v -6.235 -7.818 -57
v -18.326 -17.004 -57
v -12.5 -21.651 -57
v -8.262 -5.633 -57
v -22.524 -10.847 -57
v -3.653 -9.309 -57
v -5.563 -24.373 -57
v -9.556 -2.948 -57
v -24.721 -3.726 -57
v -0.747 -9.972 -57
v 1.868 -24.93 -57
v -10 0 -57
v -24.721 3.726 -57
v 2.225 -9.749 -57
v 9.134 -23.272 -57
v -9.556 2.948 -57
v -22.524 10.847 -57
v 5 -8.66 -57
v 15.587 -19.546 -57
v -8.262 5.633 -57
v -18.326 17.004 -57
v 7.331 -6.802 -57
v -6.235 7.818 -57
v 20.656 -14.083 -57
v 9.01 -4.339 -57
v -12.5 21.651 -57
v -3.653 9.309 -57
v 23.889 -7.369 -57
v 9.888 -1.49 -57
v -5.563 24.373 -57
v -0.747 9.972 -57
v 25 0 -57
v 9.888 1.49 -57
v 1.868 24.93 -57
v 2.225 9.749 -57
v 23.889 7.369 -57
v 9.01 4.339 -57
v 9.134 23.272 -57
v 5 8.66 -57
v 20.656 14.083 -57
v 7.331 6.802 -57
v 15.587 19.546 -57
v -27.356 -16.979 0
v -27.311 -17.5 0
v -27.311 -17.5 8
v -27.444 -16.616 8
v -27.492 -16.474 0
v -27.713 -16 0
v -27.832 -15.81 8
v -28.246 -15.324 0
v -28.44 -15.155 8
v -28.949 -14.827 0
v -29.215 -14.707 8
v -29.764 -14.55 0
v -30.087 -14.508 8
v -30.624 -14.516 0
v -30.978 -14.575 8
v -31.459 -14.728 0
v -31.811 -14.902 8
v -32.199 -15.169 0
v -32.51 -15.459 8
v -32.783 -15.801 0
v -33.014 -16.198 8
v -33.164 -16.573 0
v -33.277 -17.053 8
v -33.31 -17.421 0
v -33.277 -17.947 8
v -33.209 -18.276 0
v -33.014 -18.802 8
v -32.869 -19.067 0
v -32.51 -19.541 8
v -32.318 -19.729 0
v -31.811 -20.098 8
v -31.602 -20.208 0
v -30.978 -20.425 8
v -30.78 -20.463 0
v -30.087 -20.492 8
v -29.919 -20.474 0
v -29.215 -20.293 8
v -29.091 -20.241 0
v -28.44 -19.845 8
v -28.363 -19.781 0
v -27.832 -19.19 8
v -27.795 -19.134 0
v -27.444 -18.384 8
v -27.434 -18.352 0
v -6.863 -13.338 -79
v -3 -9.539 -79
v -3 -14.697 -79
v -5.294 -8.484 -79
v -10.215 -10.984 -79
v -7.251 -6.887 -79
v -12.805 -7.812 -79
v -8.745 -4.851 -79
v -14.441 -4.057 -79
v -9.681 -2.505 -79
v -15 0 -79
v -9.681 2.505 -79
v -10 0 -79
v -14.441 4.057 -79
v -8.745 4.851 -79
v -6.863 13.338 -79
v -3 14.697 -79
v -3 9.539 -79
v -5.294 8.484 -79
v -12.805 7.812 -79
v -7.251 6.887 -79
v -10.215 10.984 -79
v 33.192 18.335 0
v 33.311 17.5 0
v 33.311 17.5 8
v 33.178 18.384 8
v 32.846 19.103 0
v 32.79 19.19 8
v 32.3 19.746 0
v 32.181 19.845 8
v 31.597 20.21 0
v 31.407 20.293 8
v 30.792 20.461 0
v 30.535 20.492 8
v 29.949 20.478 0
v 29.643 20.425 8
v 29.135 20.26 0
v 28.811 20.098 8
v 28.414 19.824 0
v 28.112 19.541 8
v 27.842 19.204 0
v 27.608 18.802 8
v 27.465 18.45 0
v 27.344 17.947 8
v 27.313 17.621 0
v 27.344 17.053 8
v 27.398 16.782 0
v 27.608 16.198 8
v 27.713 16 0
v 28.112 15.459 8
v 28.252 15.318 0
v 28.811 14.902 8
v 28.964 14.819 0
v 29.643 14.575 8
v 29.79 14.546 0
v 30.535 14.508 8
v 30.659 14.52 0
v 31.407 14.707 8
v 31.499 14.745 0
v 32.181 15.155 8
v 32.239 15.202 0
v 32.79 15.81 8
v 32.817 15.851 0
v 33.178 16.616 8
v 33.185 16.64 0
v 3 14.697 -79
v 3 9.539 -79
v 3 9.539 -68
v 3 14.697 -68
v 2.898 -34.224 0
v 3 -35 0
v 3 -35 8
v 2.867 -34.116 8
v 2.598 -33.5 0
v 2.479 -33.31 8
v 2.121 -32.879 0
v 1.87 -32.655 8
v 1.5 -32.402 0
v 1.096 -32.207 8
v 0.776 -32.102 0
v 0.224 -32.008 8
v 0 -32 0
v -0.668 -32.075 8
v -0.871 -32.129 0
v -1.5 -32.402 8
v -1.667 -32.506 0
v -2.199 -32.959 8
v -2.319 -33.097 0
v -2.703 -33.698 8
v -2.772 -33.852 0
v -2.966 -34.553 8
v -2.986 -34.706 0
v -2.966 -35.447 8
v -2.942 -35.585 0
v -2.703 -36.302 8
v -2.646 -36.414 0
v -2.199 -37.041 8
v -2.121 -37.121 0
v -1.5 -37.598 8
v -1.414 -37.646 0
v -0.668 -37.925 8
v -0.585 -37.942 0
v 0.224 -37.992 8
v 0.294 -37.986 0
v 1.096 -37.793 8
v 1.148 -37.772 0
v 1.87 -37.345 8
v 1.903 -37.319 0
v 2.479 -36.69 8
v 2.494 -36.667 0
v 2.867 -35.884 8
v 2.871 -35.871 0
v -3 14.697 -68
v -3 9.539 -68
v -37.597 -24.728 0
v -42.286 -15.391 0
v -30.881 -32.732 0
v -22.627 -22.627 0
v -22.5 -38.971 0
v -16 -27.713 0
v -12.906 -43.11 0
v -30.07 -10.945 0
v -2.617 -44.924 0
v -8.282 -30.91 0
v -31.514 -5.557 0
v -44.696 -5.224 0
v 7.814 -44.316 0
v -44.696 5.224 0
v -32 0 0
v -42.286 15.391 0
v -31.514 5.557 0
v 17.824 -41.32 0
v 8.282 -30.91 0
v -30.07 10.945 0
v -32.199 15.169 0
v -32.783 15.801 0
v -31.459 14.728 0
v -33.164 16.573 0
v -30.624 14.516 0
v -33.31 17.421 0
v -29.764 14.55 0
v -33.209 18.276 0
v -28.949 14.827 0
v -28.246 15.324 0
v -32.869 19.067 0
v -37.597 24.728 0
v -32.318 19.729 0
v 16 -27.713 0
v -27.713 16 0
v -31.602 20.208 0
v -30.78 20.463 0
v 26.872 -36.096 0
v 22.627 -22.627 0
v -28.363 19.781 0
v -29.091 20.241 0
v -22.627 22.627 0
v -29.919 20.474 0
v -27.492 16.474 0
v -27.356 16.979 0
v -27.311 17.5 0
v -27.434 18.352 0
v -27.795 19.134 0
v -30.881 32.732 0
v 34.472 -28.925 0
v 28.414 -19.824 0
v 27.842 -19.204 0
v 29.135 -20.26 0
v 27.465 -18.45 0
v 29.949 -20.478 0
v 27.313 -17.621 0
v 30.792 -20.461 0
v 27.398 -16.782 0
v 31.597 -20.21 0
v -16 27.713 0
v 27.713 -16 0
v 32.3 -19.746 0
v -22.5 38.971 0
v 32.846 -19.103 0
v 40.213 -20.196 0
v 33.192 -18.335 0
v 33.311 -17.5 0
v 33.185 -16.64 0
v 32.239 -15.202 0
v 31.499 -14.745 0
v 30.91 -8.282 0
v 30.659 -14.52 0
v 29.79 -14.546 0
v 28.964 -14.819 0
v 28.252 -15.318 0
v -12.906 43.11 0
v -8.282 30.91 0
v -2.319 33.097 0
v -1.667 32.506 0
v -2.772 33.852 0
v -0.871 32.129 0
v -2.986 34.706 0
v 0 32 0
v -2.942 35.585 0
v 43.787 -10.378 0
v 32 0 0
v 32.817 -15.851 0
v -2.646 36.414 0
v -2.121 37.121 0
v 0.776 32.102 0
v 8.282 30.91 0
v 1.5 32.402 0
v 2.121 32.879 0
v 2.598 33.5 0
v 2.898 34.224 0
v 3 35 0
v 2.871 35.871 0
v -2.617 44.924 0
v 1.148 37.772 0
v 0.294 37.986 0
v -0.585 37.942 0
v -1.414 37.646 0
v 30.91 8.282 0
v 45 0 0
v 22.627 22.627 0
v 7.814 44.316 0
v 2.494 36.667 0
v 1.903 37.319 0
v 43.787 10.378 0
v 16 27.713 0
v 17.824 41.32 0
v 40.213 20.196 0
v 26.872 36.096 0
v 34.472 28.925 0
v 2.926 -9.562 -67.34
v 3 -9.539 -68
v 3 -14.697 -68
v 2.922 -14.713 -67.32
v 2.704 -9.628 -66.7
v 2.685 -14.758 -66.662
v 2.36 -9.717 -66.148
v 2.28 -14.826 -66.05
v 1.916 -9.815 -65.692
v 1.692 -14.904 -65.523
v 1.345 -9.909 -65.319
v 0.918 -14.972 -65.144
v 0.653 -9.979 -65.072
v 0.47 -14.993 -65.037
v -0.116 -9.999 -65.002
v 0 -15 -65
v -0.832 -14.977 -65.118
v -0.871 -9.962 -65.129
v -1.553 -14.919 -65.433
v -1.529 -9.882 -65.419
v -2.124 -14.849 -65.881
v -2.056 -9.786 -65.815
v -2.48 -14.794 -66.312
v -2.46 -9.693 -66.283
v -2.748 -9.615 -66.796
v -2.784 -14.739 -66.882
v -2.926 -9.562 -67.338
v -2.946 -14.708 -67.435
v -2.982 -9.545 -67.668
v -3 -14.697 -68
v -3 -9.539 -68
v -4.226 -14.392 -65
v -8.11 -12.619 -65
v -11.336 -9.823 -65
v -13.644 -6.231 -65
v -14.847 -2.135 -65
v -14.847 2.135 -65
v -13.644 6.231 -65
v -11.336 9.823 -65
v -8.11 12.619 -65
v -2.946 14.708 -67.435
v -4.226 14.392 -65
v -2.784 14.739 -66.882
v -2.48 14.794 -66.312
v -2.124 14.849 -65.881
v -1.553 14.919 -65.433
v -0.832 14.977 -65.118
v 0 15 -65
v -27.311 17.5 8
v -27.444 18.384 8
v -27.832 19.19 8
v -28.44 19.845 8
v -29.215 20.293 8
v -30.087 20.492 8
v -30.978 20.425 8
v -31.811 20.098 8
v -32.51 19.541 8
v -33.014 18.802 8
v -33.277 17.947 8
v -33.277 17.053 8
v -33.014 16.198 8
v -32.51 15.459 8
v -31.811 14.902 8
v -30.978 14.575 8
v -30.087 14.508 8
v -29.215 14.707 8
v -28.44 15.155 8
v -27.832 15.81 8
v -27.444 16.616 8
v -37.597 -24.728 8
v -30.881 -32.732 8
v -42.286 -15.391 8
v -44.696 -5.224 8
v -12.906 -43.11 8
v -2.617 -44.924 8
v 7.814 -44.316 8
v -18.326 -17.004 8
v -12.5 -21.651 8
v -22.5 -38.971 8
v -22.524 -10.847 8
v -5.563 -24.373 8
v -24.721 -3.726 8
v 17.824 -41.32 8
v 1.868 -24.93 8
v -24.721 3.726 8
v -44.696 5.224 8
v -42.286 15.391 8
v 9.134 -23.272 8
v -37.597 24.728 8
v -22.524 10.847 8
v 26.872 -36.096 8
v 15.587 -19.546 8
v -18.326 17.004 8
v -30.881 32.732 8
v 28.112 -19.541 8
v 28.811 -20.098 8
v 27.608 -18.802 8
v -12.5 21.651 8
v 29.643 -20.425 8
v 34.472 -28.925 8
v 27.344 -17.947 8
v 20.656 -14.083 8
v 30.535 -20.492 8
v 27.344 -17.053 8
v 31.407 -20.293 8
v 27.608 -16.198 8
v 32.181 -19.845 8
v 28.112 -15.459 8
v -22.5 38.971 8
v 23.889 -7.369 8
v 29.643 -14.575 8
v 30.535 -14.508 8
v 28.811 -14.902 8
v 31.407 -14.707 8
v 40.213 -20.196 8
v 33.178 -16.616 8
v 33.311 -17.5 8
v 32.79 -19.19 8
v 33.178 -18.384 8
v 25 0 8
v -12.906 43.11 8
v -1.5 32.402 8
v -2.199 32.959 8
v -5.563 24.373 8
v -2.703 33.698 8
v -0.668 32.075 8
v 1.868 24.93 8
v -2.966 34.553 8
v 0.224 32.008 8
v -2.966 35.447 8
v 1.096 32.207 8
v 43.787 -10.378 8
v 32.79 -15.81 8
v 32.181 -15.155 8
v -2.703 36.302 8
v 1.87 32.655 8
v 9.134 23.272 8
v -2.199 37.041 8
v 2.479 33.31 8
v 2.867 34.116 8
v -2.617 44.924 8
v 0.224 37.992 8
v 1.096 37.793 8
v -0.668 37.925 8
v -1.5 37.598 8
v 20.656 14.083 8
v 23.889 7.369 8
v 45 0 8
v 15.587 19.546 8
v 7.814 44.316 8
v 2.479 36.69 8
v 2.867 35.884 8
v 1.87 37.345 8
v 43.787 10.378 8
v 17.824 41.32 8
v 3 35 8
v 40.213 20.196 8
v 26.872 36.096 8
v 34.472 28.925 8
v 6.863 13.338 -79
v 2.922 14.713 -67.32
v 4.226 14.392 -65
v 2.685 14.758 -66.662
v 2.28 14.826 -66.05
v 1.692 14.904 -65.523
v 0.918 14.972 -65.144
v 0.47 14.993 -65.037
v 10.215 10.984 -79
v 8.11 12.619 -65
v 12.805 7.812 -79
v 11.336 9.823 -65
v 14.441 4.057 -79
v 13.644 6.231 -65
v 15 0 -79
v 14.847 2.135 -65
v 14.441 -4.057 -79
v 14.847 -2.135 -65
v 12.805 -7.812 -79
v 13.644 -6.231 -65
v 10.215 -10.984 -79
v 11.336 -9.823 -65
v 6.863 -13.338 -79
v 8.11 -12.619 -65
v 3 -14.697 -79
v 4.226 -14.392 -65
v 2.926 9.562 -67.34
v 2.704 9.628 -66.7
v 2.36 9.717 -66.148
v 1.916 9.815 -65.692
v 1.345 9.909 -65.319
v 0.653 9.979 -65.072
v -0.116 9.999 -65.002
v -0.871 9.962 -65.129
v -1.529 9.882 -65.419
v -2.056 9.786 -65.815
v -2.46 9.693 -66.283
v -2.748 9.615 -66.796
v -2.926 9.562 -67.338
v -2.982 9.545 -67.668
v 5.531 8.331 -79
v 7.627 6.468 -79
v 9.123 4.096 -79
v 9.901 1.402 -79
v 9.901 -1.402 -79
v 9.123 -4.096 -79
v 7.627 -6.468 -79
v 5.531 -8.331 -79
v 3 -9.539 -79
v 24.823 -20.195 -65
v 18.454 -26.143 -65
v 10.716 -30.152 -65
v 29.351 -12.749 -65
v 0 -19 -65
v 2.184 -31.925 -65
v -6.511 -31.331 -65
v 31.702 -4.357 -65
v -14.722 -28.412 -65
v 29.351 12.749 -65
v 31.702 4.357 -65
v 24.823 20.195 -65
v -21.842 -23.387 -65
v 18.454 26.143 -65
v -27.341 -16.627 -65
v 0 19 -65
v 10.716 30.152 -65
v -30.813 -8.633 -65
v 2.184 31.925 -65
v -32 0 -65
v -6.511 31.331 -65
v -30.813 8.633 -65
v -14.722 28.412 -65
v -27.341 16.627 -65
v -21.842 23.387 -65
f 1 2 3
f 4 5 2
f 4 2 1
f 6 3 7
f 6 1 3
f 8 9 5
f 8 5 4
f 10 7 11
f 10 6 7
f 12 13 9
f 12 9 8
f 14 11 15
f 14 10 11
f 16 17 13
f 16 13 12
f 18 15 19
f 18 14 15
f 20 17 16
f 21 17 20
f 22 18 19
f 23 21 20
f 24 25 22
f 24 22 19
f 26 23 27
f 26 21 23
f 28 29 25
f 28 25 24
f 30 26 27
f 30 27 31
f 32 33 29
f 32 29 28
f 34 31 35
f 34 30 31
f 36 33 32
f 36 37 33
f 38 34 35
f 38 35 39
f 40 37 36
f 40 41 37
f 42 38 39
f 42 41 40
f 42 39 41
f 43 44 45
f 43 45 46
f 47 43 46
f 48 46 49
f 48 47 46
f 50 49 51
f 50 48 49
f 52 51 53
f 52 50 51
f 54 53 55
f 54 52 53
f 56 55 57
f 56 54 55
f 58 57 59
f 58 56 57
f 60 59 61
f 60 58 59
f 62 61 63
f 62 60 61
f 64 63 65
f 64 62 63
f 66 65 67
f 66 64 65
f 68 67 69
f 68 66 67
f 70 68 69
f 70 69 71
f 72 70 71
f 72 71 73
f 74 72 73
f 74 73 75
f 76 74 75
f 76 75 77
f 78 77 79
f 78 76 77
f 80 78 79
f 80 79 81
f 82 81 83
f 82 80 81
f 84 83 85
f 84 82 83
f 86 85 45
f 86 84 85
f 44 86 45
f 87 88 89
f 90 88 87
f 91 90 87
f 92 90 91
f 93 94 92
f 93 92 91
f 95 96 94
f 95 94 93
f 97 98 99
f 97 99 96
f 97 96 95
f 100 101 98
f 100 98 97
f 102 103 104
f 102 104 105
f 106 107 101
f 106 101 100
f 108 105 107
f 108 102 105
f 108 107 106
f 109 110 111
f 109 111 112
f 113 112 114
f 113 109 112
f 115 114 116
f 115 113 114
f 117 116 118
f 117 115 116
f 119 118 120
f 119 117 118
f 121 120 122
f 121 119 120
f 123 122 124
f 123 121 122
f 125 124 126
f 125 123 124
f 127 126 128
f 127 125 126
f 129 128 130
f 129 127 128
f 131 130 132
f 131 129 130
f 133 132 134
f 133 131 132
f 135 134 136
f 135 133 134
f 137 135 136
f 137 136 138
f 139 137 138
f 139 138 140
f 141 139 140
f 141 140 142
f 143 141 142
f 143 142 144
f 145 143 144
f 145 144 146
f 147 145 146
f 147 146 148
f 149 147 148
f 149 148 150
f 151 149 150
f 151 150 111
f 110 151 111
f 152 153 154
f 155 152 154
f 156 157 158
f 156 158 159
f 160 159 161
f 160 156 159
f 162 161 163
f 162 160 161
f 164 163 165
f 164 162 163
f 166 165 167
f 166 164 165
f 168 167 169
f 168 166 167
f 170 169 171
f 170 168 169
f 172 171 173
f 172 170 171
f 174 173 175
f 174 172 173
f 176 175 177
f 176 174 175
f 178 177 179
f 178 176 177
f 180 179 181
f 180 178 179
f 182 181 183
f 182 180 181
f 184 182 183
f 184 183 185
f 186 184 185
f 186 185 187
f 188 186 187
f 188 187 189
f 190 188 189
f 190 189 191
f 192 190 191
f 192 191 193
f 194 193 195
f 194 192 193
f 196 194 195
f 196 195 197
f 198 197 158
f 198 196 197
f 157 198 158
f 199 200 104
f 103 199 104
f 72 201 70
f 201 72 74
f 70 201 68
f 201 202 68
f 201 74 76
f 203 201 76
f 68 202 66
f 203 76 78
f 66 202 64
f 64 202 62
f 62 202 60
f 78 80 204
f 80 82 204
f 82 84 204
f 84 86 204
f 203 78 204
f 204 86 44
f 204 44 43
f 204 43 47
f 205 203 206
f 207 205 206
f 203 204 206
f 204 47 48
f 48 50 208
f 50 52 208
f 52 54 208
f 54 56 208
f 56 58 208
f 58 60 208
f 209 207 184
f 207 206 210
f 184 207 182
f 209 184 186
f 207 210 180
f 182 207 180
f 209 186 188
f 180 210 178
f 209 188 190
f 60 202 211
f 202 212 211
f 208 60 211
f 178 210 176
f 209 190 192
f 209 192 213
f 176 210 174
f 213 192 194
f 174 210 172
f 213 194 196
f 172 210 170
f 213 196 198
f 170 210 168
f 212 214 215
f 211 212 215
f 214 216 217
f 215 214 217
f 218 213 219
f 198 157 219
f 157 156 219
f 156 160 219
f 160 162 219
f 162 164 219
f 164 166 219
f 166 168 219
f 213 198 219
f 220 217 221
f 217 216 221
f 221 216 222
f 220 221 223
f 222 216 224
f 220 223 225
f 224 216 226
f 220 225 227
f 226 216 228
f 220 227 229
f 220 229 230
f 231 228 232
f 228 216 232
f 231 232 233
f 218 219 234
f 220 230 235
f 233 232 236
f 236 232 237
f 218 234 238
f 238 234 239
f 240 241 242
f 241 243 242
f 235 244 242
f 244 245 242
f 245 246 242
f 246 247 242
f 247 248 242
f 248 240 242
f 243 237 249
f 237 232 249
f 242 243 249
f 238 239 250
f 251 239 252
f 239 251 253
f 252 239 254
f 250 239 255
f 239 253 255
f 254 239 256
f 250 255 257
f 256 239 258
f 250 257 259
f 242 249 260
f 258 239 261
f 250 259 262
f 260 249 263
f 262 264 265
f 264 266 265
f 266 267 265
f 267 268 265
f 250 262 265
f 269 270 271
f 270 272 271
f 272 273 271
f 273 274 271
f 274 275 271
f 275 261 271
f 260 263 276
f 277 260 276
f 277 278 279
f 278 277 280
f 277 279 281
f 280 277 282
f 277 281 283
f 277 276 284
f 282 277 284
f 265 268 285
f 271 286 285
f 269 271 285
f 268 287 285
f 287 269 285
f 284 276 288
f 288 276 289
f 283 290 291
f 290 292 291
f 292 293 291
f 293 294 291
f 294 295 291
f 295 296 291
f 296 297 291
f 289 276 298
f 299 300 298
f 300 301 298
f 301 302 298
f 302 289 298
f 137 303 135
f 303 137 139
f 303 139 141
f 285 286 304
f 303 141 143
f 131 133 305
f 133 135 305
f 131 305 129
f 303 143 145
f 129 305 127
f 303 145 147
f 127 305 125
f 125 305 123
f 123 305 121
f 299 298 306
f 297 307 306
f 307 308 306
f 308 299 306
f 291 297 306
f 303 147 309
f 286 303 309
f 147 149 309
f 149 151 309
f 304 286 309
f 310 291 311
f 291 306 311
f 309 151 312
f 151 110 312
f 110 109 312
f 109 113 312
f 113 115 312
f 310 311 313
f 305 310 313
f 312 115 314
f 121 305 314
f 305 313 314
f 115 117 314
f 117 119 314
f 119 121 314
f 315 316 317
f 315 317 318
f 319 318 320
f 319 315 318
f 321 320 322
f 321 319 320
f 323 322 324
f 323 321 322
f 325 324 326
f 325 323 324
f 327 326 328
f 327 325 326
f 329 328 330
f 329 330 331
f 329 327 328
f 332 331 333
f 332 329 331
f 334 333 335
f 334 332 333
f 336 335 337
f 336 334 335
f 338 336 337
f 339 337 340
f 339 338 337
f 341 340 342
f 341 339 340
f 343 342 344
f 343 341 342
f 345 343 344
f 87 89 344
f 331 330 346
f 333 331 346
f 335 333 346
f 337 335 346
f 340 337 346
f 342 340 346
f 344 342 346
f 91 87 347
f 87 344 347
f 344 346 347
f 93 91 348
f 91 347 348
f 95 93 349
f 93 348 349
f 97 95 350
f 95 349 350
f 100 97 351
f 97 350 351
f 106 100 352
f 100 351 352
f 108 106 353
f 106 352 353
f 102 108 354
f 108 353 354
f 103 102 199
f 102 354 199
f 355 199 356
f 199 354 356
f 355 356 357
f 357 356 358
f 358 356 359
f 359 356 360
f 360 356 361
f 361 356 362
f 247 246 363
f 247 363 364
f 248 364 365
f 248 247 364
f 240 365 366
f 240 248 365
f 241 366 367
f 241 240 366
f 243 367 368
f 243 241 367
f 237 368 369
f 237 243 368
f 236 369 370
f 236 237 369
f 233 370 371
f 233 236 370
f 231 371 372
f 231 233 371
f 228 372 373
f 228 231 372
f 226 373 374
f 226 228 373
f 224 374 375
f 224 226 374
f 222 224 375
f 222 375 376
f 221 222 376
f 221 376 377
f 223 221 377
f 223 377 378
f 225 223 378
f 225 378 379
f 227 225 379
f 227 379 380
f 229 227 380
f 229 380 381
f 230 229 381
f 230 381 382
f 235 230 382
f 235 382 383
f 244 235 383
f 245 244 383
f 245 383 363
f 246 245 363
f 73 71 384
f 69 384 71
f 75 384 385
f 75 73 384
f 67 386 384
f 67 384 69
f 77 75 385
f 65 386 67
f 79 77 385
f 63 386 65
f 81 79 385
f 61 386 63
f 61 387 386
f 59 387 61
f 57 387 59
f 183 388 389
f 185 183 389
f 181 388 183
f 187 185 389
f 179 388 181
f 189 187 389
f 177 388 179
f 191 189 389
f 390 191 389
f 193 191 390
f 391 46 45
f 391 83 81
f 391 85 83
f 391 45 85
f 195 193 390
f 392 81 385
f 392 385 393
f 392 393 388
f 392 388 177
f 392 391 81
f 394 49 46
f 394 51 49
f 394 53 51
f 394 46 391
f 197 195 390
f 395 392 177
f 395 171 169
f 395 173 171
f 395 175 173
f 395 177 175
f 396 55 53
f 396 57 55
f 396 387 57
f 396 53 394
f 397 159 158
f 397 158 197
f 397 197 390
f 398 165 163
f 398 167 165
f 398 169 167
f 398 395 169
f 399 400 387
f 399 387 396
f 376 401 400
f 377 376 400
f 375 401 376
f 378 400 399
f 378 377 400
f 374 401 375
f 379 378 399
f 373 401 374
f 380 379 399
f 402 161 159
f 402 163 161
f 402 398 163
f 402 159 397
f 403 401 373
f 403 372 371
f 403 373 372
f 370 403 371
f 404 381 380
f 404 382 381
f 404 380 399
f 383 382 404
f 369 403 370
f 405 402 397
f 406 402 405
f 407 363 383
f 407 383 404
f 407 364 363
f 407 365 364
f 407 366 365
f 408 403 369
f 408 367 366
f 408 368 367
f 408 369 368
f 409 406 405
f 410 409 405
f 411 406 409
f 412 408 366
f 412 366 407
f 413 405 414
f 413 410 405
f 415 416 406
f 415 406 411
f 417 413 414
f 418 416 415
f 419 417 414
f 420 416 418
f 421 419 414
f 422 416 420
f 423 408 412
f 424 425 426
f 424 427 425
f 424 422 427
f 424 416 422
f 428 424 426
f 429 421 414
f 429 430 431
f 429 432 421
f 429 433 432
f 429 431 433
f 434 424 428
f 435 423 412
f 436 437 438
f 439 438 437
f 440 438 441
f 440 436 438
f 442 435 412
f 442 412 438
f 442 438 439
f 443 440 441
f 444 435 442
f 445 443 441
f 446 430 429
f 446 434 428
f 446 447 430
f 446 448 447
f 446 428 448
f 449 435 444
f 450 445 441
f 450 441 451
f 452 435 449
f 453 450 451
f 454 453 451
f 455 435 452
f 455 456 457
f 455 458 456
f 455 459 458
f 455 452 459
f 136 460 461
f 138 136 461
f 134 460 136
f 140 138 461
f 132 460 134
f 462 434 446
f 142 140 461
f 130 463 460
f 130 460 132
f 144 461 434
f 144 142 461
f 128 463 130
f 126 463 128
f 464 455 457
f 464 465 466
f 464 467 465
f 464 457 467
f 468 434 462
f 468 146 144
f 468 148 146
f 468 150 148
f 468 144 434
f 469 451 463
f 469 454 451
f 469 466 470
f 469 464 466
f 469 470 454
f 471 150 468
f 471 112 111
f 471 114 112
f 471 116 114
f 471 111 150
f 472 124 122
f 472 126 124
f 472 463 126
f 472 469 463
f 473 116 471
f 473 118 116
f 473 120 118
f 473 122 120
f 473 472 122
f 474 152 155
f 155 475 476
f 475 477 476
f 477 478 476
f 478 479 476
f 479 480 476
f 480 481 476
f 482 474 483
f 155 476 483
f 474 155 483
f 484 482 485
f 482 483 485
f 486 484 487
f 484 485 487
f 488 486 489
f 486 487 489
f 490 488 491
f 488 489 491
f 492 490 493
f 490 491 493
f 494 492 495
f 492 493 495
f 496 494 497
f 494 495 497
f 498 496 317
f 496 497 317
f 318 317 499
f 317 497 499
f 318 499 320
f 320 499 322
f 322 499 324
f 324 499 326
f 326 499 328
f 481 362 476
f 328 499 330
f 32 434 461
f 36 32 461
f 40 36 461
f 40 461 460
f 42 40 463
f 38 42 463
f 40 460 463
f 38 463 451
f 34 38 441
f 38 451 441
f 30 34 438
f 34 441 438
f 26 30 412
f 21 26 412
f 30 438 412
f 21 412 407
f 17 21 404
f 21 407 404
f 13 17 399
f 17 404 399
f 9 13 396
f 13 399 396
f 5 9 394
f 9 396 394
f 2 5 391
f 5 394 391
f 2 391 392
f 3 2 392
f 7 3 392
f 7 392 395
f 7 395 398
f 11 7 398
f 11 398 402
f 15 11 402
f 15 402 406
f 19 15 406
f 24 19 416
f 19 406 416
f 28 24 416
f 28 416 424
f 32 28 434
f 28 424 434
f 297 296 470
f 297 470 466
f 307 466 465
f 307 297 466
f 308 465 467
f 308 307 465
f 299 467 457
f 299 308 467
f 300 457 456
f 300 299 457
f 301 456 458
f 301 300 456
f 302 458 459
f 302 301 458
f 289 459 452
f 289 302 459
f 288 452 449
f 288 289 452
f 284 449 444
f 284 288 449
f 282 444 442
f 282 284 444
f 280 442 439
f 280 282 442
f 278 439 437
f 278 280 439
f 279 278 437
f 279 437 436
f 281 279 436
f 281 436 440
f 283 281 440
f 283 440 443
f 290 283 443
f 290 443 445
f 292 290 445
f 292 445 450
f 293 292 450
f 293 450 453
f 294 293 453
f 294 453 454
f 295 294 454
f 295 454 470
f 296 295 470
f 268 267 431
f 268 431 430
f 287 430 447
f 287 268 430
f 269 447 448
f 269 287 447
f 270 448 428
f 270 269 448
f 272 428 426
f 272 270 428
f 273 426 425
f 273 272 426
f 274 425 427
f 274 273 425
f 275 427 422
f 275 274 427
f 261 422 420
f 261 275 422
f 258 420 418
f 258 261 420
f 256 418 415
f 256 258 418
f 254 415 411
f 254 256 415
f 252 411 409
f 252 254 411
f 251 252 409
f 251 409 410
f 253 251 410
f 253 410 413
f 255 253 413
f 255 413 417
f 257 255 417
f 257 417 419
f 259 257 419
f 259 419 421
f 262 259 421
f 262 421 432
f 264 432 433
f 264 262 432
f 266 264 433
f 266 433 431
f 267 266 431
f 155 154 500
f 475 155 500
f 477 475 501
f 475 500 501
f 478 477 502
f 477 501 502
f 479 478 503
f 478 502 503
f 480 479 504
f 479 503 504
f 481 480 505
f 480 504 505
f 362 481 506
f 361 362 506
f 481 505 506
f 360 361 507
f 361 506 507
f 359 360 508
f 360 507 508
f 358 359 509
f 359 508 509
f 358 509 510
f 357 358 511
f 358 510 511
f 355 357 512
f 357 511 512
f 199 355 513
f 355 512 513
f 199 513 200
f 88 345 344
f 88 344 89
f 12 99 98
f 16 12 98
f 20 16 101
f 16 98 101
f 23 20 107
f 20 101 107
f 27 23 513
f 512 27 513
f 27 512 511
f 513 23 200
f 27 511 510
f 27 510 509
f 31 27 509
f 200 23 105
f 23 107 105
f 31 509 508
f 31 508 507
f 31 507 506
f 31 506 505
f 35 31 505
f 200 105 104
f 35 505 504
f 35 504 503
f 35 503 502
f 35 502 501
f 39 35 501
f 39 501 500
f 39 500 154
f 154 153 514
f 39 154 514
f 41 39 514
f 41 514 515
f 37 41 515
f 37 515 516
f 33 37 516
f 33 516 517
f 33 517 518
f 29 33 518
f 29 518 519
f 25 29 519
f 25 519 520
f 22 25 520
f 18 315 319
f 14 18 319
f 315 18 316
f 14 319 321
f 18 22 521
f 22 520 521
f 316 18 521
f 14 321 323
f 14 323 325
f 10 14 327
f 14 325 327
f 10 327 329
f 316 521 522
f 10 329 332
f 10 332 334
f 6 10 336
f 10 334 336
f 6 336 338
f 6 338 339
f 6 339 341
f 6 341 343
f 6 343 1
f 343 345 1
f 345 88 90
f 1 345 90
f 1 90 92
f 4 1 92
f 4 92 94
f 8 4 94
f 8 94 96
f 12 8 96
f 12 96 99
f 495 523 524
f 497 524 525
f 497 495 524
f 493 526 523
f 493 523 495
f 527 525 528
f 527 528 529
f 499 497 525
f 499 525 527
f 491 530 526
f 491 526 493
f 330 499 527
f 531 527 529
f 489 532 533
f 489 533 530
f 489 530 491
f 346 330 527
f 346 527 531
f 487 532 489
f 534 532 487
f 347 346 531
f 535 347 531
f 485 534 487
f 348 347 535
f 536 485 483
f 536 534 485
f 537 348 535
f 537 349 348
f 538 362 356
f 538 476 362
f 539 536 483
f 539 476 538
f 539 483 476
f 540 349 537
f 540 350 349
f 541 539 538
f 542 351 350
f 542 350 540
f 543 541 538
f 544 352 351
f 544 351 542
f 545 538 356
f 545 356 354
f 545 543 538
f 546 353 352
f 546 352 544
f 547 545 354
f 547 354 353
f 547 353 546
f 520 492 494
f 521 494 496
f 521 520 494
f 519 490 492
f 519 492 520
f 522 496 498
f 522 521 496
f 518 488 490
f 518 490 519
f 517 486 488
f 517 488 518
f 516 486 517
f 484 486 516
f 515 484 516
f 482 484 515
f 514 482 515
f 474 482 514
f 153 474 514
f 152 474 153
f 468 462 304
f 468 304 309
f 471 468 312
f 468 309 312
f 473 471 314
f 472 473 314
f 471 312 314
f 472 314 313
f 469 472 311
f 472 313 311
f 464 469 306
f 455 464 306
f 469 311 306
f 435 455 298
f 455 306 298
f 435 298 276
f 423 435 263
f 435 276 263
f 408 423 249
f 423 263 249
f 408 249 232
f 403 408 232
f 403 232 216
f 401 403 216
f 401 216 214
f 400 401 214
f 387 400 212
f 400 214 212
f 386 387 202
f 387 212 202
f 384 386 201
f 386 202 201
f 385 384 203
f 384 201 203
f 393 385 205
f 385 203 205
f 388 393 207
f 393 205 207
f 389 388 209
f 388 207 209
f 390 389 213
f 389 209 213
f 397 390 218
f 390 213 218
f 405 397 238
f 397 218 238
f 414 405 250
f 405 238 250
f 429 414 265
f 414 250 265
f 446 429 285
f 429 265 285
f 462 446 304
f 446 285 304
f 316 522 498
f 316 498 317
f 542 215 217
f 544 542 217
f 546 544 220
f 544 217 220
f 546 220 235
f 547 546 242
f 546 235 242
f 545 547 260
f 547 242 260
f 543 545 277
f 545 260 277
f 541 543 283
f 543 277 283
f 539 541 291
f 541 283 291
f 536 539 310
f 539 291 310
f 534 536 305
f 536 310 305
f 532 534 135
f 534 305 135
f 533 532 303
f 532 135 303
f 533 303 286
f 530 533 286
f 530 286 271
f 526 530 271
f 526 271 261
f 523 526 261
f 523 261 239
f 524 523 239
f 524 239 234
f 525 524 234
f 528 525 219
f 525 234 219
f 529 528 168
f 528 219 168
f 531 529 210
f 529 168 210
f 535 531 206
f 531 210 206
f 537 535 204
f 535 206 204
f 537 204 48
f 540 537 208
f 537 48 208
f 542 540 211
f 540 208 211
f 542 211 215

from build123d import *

# Parameters (mm, degrees)
SZKIC1_R                        = 45
SZKIC1_R_2                      = 3
DODANIE_WYCI_GNI_CIE1_DEPTH     = 8
SZKIC2_R                        = 32
DODANIE_WYCI_GNI_CIE2_DEPTH     = 65
SZKIC3_R                        = 15
DODANIE_WYCI_GNI_CIE3_DEPTH     = 14
SZKIC4_R                        = 10
WYTNIJ_WYCI_GNI_CIE1_DEPTH      = 96
SZKIC5_R                        = 25
WYTNIJ_WYCI_GNI_CIE2_DEPTH      = 65
WYTNIJ_WYCI_GNI_CIE3_DEPTH      = 19
WYTNIJ_WYCI_GNI_CIE3_DEPTH_BACK = 19


with BuildPart() as part:
    # Szkic1 → Dodanie-wyciągnięcie1 (new body)
    with BuildSketch(Plane.XY):
        Circle(SZKIC1_R)
        with Locations((0, 35)):
            Circle(SZKIC1_R_2, mode=Mode.SUBTRACT)
        with Locations((-30.310889132, 17.5)):
            Circle(SZKIC1_R_2, mode=Mode.SUBTRACT)
        with Locations((30.310889132, -17.5)):
            Circle(SZKIC1_R_2, mode=Mode.SUBTRACT)
        with Locations((30.310889132, 17.5)):
            Circle(SZKIC1_R_2, mode=Mode.SUBTRACT)
        with Locations((-30.310889132, -17.5)):
            Circle(SZKIC1_R_2, mode=Mode.SUBTRACT)
        with Locations((0, -35)):
            Circle(SZKIC1_R_2, mode=Mode.SUBTRACT)
    extrude(amount=DODANIE_WYCI_GNI_CIE1_DEPTH)

    # Szkic2 → Dodanie-wyciągnięcie2 (add)
    with BuildSketch(Plane(origin=(0, 0, 0), x_dir=(-1, 0, 0), z_dir=(0, 0, -1))):
        Circle(SZKIC2_R)
    extrude(amount=DODANIE_WYCI_GNI_CIE2_DEPTH)

    # Szkic3 → Dodanie-wyciągnięcie3 (add)
    with BuildSketch(Plane(origin=(0, 0, -65), x_dir=(-1, 0, 0), z_dir=(0, 0, -1))):
        Circle(SZKIC3_R)
    extrude(amount=DODANIE_WYCI_GNI_CIE3_DEPTH)

    # Szkic4 → Wytnij-wyciągnięcie1 (cut)
    with BuildSketch(Plane(origin=(0, 0, -79), x_dir=(-1, 0, 0), z_dir=(0, 0, -1))):
        Circle(SZKIC4_R)
    extrude(amount=-WYTNIJ_WYCI_GNI_CIE1_DEPTH, mode=Mode.SUBTRACT)

    # Szkic5 → Wytnij-wyciągnięcie2 (cut)
    with BuildSketch(Plane.XY.offset(8)):
        Circle(SZKIC5_R)
    extrude(amount=-WYTNIJ_WYCI_GNI_CIE2_DEPTH, mode=Mode.SUBTRACT)

    # Szkic6 → Wytnij-wyciągnięcie3 (cut, two sides: drawn at the far end of the back side and taken through both)
    with BuildSketch(Plane(origin=(0, 0, 0), x_dir=(1, 0, 0), z_dir=(0, 1, 0)).offset(-WYTNIJ_WYCI_GNI_CIE3_DEPTH_BACK)):
        with BuildLine():
            Line((-3, 85.590042605), (3, 85.590042605))
            Line((3, 85.590042605), (3, 68))
            ThreePointArc((3, 68), (0, 65), (-3, 68))
            Line((-3, 68), (-3, 85.590042605))
        make_face()
    extrude(amount=WYTNIJ_WYCI_GNI_CIE3_DEPTH + WYTNIJ_WYCI_GNI_CIE3_DEPTH_BACK, mode=Mode.SUBTRACT)


solid = part.part
